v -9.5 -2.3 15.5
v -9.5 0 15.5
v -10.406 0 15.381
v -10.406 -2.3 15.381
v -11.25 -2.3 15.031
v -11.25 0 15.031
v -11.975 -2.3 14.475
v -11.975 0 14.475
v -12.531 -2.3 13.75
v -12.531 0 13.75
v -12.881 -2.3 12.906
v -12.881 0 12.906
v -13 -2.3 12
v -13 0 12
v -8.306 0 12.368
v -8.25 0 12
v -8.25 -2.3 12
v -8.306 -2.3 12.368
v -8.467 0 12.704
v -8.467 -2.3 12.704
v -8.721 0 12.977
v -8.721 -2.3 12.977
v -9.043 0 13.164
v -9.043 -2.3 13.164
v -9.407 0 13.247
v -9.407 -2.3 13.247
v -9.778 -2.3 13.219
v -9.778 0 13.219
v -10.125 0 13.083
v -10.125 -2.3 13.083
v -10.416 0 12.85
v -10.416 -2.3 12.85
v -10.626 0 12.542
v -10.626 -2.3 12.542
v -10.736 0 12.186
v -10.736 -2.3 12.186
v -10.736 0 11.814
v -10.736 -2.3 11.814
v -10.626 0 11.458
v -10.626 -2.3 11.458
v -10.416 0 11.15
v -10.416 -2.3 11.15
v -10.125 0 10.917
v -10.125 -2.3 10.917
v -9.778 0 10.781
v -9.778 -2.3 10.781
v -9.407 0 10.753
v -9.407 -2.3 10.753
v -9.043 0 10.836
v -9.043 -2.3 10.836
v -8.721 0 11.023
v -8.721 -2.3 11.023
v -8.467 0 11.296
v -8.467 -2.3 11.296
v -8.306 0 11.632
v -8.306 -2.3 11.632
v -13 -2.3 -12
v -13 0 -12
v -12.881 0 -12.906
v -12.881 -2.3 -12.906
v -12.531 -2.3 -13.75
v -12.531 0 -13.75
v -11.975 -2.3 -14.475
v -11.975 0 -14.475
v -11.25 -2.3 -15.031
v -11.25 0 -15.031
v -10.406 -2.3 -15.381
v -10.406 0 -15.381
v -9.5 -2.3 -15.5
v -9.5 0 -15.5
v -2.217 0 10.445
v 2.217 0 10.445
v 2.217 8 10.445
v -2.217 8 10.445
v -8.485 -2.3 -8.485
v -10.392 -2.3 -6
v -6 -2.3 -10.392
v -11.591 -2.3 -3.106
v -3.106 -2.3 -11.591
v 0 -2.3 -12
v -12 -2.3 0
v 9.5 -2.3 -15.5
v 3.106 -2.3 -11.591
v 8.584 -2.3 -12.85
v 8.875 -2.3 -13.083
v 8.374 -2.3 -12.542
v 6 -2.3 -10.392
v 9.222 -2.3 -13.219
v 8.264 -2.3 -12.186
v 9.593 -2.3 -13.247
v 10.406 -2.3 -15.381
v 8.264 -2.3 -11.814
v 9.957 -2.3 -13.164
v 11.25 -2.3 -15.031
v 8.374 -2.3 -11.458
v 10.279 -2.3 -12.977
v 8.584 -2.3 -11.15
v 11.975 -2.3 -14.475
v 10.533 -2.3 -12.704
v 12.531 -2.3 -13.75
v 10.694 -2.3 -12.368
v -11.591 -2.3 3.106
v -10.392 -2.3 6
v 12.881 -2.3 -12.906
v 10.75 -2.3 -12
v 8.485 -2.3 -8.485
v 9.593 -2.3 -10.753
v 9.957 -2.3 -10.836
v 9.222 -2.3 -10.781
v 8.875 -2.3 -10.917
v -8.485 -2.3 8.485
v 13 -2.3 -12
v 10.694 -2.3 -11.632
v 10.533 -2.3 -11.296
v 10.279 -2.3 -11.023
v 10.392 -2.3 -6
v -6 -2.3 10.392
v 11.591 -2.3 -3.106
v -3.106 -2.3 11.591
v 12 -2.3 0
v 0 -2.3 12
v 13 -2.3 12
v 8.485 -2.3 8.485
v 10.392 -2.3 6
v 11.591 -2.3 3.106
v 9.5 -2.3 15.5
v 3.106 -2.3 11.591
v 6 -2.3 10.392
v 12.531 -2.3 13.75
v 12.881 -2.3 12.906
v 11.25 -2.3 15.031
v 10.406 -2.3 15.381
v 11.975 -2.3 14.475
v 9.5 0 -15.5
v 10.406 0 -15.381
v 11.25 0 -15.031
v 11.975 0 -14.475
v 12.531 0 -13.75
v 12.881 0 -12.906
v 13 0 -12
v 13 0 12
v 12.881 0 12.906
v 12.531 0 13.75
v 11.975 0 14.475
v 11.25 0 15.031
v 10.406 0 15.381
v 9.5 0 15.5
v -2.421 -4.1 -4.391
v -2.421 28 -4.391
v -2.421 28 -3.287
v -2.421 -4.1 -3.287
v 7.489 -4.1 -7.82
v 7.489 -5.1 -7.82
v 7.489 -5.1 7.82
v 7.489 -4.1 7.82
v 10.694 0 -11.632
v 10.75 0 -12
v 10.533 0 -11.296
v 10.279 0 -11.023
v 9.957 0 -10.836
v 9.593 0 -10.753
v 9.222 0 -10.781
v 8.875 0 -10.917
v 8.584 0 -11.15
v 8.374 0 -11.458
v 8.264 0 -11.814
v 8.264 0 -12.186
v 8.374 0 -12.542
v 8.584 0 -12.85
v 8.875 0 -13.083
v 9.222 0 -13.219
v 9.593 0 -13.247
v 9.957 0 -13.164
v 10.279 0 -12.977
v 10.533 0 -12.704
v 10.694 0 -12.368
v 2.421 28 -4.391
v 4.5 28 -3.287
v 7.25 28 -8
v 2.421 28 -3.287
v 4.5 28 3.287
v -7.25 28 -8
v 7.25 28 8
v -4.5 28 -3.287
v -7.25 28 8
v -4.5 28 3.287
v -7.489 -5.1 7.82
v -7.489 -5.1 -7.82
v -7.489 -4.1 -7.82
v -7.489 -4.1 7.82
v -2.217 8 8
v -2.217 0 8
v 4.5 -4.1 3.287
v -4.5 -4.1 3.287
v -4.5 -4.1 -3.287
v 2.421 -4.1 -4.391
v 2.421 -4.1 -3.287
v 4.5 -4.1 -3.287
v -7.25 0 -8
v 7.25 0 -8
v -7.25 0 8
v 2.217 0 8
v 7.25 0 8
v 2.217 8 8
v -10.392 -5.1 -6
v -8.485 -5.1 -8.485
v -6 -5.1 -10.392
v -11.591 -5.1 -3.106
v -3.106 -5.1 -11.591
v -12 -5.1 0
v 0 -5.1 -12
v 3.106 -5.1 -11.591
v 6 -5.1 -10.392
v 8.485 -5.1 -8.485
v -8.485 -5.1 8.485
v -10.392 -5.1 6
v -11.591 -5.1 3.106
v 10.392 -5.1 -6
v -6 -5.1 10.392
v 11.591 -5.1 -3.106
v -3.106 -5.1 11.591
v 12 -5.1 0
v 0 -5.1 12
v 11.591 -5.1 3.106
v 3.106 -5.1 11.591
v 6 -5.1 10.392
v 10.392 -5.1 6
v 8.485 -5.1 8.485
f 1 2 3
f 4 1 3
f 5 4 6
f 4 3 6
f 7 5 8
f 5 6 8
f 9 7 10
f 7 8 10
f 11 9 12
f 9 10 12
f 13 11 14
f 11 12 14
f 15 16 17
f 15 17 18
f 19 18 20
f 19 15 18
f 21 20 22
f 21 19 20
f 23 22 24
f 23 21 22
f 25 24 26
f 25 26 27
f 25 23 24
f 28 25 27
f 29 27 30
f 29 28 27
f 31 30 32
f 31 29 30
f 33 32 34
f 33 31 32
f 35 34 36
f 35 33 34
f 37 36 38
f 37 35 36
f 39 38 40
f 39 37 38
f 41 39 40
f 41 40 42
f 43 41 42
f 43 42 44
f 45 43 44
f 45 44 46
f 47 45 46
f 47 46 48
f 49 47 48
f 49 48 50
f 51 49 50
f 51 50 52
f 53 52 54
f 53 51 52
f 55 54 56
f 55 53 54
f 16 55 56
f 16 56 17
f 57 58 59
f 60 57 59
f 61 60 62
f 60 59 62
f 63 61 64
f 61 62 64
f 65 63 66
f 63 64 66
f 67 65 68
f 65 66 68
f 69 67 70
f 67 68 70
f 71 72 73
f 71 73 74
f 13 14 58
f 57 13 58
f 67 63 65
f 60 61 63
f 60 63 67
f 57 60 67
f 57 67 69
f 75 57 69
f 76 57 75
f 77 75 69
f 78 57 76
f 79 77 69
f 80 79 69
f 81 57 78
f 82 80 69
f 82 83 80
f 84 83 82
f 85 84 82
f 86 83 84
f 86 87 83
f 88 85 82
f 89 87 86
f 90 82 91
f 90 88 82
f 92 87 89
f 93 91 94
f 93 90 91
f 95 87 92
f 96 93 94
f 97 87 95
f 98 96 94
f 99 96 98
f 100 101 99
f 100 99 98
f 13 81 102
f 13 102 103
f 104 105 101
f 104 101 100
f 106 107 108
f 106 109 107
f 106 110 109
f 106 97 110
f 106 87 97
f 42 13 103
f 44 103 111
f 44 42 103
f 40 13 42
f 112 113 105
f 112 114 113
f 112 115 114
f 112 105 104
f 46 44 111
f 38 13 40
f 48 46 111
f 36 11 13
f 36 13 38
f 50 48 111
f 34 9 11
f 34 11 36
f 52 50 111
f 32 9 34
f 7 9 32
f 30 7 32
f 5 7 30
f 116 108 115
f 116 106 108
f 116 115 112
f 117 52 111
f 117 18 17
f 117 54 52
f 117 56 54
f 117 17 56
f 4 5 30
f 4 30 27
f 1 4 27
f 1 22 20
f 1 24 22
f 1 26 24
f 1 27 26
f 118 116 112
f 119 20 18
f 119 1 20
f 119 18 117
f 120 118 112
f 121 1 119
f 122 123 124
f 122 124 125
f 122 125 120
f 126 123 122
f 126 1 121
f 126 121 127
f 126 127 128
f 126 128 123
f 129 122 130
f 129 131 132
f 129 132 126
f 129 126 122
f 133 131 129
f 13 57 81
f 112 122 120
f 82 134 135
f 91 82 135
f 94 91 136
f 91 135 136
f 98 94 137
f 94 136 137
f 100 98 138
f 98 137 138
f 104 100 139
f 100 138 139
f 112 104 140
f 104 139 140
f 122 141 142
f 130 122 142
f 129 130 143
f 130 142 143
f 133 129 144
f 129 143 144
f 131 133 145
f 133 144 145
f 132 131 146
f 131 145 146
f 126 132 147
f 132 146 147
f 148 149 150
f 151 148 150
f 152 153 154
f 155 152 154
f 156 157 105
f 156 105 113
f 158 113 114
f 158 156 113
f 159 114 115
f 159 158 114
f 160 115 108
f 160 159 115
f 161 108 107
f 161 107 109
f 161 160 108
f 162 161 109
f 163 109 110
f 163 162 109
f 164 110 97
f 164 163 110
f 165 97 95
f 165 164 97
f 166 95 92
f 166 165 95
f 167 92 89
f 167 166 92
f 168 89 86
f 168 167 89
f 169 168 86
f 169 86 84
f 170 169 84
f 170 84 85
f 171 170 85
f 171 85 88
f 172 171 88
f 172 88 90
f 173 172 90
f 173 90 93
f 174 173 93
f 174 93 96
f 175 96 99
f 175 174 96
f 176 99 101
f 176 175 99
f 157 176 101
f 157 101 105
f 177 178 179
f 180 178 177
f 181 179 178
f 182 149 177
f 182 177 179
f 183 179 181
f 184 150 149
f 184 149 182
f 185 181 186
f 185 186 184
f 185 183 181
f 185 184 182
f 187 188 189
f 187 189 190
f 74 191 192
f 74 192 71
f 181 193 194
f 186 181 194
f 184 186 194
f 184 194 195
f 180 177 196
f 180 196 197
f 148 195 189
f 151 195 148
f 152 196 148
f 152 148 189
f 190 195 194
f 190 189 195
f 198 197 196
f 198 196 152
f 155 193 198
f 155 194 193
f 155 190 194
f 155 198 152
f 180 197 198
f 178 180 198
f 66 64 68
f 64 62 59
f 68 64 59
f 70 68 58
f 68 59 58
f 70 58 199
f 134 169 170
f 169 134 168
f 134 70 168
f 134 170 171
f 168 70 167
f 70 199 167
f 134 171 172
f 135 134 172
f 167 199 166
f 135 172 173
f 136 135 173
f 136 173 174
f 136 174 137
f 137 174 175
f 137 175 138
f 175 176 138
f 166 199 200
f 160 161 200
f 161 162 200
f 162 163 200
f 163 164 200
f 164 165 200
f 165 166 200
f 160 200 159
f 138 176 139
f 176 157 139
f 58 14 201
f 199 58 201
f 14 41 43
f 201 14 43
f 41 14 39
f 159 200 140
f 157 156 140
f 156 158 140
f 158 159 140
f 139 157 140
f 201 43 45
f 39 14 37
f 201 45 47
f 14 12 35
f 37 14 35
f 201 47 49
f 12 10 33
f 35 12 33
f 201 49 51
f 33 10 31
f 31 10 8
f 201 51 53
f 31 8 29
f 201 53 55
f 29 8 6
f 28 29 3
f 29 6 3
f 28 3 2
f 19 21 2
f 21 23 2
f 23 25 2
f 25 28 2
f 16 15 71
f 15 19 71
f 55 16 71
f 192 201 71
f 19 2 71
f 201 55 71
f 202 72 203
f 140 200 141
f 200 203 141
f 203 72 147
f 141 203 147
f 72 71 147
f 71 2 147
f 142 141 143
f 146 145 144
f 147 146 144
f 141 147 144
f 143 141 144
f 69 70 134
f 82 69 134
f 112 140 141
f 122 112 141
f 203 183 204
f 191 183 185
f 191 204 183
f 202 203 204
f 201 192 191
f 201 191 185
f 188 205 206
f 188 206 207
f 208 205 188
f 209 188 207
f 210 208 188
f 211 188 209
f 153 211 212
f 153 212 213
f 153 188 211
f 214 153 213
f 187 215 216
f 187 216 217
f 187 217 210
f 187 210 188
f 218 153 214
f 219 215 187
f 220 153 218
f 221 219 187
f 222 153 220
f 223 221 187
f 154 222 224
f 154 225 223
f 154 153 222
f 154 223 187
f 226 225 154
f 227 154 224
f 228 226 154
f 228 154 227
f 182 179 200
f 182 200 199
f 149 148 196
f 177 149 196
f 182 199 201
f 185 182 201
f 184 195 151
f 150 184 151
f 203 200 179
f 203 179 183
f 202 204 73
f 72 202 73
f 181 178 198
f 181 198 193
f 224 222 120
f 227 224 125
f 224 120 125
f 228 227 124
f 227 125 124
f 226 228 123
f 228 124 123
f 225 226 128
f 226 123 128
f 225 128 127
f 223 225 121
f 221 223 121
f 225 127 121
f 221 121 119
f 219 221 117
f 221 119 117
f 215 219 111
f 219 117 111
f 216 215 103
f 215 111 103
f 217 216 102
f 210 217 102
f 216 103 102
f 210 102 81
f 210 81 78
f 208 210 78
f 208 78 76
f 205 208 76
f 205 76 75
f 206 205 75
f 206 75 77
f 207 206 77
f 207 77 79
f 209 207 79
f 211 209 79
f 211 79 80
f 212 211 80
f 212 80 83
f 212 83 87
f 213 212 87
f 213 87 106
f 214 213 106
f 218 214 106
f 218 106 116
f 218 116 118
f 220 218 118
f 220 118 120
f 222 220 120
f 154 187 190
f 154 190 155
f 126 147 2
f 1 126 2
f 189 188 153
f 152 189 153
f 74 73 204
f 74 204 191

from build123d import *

# Parameters (mm, degrees)
F0_R      = 1.25
F0_R_2    = 12
F1_DEPTH  = 2.3
F2_DEPTH  = 5.1
F3_W      = 14.9775519967
F3_H      = 15.6408976763
F3_W_2    = 4.8427809961
F3_H_2    = 1.104
F4_DEPTH  = 1
F5_DEPTH  = 3
F6_W      = 14.5
F6_H      = 16
F7_DEPTH  = 28
F8_W      = 4.4338763691
F8_H      = 4.8907462656
F9_DEPTH  = 8
F10_DEPTH = 30.1


with BuildPart() as f1:
    # F0 (on Front) → F1 (new body)
    with BuildSketch(Plane.XZ):
        with BuildLine():
            ThreePointArc((13, 12), (11.9748737342, 14.4748737342), (9.5, 15.5))
            Line((9.5, 15.5), (-9.5, 15.5))
            ThreePointArc((-9.5, 15.5), (-11.9748737342, 14.4748737342), (-13, 12))
            Line((-13, 12), (-13, -12))
            ThreePointArc((-13, -12), (-11.9748737342, -14.4748737342), (-9.5, -15.5))
            Line((-9.5, -15.5), (9.5, -15.5))
            ThreePointArc((9.5, -15.5), (11.9748737342, -14.4748737342), (13, -12))
            Line((13, -12), (13, 12))
        make_face()
        with Locations((9.5, -12)):
            Circle(F0_R, mode=Mode.SUBTRACT)
        with Locations((-9.5, 12)):
            Circle(F0_R, mode=Mode.SUBTRACT)
        Circle(F0_R_2, mode=Mode.SUBTRACT)
        Circle(F0_R_2)
    extrude(amount=F1_DEPTH)

    # F0 (on Front) → F2 (join)
    with BuildSketch(Plane.XZ):
        Circle(F0_R_2)
    extrude(amount=F2_DEPTH)

    # F3 (on face) → F4 (cut)
    with BuildSketch(Plane.XZ.offset(5.1)):
        Rectangle(F3_W, F3_H)
        Polygon((-4.5, 3.2868520357), (4.5, 3.2868520357), (4.5, -3.2868520357), (2.4213904981, -3.2868520357), (2.4213904981, -4.3908520357), (-2.4213904981, -4.3908520357), (-2.4213904981, -3.2868520357), (-4.5, -3.2868520357), align=None, mode=Mode.SUBTRACT)
        Polygon((4.5, -3.2868520357), (4.5, 3.2868520357), (-4.5, 3.2868520357), (-4.5, -3.2868520357), (-2.4213904981, -3.2868520357), (-2.4213904981, -2.1828520357), (2.4213904981, -2.1828520357), (2.4213904981, -3.2868520357), align=None)
        with Locations((0, -2.7348520357)):
            Rectangle(F3_W_2, F3_H_2)
        with Locations((0, -3.8388520357)):
            Rectangle(F3_W_2, F3_H_2)
    extrude(amount=-F4_DEPTH, mode=Mode.SUBTRACT)

    # F3 (on face) → F5 (cut)
    with BuildSketch(Plane.XZ.offset(5.1)):
        Polygon((4.5, -3.2868520357), (4.5, 3.2868520357), (-4.5, 3.2868520357), (-4.5, -3.2868520357), (-2.4213904981, -3.2868520357), (-2.4213904981, -2.1828520357), (2.4213904981, -2.1828520357), (2.4213904981, -3.2868520357), align=None)
        with Locations((0, -2.7348520357)):
            Rectangle(F3_W_2, F3_H_2)
        with Locations((0, -3.8388520357)):
            Rectangle(F3_W_2, F3_H_2)
    extrude(amount=-F5_DEPTH, mode=Mode.SUBTRACT)

    # F6 (on face) → F7 (join)
    with BuildSketch(Plane(origin=(0, 0, 0), x_dir=(-1, 0, 0), z_dir=(0, 1, 0))):
        Rectangle(F6_W, F6_H)
    extrude(amount=F7_DEPTH)

    # F8 (on face) → F9 (join)
    with BuildSketch(Plane(origin=(0, 0, 0), x_dir=(-1, 0, 0), z_dir=(0, 1, 0))):
        with Locations((0, 8)):
            Rectangle(F8_W, F8_H)
    extrude(amount=F9_DEPTH)

    # F10 (cut, through all): a face of the model
    f10_faces = [f1.faces().sort_by_distance(p)[0] for p in [
        (0, -2.1, -0.3181557698),
    ]]
    extrude(f10_faces, amount=-F10_DEPTH, mode=Mode.SUBTRACT)


solid = f1.part
